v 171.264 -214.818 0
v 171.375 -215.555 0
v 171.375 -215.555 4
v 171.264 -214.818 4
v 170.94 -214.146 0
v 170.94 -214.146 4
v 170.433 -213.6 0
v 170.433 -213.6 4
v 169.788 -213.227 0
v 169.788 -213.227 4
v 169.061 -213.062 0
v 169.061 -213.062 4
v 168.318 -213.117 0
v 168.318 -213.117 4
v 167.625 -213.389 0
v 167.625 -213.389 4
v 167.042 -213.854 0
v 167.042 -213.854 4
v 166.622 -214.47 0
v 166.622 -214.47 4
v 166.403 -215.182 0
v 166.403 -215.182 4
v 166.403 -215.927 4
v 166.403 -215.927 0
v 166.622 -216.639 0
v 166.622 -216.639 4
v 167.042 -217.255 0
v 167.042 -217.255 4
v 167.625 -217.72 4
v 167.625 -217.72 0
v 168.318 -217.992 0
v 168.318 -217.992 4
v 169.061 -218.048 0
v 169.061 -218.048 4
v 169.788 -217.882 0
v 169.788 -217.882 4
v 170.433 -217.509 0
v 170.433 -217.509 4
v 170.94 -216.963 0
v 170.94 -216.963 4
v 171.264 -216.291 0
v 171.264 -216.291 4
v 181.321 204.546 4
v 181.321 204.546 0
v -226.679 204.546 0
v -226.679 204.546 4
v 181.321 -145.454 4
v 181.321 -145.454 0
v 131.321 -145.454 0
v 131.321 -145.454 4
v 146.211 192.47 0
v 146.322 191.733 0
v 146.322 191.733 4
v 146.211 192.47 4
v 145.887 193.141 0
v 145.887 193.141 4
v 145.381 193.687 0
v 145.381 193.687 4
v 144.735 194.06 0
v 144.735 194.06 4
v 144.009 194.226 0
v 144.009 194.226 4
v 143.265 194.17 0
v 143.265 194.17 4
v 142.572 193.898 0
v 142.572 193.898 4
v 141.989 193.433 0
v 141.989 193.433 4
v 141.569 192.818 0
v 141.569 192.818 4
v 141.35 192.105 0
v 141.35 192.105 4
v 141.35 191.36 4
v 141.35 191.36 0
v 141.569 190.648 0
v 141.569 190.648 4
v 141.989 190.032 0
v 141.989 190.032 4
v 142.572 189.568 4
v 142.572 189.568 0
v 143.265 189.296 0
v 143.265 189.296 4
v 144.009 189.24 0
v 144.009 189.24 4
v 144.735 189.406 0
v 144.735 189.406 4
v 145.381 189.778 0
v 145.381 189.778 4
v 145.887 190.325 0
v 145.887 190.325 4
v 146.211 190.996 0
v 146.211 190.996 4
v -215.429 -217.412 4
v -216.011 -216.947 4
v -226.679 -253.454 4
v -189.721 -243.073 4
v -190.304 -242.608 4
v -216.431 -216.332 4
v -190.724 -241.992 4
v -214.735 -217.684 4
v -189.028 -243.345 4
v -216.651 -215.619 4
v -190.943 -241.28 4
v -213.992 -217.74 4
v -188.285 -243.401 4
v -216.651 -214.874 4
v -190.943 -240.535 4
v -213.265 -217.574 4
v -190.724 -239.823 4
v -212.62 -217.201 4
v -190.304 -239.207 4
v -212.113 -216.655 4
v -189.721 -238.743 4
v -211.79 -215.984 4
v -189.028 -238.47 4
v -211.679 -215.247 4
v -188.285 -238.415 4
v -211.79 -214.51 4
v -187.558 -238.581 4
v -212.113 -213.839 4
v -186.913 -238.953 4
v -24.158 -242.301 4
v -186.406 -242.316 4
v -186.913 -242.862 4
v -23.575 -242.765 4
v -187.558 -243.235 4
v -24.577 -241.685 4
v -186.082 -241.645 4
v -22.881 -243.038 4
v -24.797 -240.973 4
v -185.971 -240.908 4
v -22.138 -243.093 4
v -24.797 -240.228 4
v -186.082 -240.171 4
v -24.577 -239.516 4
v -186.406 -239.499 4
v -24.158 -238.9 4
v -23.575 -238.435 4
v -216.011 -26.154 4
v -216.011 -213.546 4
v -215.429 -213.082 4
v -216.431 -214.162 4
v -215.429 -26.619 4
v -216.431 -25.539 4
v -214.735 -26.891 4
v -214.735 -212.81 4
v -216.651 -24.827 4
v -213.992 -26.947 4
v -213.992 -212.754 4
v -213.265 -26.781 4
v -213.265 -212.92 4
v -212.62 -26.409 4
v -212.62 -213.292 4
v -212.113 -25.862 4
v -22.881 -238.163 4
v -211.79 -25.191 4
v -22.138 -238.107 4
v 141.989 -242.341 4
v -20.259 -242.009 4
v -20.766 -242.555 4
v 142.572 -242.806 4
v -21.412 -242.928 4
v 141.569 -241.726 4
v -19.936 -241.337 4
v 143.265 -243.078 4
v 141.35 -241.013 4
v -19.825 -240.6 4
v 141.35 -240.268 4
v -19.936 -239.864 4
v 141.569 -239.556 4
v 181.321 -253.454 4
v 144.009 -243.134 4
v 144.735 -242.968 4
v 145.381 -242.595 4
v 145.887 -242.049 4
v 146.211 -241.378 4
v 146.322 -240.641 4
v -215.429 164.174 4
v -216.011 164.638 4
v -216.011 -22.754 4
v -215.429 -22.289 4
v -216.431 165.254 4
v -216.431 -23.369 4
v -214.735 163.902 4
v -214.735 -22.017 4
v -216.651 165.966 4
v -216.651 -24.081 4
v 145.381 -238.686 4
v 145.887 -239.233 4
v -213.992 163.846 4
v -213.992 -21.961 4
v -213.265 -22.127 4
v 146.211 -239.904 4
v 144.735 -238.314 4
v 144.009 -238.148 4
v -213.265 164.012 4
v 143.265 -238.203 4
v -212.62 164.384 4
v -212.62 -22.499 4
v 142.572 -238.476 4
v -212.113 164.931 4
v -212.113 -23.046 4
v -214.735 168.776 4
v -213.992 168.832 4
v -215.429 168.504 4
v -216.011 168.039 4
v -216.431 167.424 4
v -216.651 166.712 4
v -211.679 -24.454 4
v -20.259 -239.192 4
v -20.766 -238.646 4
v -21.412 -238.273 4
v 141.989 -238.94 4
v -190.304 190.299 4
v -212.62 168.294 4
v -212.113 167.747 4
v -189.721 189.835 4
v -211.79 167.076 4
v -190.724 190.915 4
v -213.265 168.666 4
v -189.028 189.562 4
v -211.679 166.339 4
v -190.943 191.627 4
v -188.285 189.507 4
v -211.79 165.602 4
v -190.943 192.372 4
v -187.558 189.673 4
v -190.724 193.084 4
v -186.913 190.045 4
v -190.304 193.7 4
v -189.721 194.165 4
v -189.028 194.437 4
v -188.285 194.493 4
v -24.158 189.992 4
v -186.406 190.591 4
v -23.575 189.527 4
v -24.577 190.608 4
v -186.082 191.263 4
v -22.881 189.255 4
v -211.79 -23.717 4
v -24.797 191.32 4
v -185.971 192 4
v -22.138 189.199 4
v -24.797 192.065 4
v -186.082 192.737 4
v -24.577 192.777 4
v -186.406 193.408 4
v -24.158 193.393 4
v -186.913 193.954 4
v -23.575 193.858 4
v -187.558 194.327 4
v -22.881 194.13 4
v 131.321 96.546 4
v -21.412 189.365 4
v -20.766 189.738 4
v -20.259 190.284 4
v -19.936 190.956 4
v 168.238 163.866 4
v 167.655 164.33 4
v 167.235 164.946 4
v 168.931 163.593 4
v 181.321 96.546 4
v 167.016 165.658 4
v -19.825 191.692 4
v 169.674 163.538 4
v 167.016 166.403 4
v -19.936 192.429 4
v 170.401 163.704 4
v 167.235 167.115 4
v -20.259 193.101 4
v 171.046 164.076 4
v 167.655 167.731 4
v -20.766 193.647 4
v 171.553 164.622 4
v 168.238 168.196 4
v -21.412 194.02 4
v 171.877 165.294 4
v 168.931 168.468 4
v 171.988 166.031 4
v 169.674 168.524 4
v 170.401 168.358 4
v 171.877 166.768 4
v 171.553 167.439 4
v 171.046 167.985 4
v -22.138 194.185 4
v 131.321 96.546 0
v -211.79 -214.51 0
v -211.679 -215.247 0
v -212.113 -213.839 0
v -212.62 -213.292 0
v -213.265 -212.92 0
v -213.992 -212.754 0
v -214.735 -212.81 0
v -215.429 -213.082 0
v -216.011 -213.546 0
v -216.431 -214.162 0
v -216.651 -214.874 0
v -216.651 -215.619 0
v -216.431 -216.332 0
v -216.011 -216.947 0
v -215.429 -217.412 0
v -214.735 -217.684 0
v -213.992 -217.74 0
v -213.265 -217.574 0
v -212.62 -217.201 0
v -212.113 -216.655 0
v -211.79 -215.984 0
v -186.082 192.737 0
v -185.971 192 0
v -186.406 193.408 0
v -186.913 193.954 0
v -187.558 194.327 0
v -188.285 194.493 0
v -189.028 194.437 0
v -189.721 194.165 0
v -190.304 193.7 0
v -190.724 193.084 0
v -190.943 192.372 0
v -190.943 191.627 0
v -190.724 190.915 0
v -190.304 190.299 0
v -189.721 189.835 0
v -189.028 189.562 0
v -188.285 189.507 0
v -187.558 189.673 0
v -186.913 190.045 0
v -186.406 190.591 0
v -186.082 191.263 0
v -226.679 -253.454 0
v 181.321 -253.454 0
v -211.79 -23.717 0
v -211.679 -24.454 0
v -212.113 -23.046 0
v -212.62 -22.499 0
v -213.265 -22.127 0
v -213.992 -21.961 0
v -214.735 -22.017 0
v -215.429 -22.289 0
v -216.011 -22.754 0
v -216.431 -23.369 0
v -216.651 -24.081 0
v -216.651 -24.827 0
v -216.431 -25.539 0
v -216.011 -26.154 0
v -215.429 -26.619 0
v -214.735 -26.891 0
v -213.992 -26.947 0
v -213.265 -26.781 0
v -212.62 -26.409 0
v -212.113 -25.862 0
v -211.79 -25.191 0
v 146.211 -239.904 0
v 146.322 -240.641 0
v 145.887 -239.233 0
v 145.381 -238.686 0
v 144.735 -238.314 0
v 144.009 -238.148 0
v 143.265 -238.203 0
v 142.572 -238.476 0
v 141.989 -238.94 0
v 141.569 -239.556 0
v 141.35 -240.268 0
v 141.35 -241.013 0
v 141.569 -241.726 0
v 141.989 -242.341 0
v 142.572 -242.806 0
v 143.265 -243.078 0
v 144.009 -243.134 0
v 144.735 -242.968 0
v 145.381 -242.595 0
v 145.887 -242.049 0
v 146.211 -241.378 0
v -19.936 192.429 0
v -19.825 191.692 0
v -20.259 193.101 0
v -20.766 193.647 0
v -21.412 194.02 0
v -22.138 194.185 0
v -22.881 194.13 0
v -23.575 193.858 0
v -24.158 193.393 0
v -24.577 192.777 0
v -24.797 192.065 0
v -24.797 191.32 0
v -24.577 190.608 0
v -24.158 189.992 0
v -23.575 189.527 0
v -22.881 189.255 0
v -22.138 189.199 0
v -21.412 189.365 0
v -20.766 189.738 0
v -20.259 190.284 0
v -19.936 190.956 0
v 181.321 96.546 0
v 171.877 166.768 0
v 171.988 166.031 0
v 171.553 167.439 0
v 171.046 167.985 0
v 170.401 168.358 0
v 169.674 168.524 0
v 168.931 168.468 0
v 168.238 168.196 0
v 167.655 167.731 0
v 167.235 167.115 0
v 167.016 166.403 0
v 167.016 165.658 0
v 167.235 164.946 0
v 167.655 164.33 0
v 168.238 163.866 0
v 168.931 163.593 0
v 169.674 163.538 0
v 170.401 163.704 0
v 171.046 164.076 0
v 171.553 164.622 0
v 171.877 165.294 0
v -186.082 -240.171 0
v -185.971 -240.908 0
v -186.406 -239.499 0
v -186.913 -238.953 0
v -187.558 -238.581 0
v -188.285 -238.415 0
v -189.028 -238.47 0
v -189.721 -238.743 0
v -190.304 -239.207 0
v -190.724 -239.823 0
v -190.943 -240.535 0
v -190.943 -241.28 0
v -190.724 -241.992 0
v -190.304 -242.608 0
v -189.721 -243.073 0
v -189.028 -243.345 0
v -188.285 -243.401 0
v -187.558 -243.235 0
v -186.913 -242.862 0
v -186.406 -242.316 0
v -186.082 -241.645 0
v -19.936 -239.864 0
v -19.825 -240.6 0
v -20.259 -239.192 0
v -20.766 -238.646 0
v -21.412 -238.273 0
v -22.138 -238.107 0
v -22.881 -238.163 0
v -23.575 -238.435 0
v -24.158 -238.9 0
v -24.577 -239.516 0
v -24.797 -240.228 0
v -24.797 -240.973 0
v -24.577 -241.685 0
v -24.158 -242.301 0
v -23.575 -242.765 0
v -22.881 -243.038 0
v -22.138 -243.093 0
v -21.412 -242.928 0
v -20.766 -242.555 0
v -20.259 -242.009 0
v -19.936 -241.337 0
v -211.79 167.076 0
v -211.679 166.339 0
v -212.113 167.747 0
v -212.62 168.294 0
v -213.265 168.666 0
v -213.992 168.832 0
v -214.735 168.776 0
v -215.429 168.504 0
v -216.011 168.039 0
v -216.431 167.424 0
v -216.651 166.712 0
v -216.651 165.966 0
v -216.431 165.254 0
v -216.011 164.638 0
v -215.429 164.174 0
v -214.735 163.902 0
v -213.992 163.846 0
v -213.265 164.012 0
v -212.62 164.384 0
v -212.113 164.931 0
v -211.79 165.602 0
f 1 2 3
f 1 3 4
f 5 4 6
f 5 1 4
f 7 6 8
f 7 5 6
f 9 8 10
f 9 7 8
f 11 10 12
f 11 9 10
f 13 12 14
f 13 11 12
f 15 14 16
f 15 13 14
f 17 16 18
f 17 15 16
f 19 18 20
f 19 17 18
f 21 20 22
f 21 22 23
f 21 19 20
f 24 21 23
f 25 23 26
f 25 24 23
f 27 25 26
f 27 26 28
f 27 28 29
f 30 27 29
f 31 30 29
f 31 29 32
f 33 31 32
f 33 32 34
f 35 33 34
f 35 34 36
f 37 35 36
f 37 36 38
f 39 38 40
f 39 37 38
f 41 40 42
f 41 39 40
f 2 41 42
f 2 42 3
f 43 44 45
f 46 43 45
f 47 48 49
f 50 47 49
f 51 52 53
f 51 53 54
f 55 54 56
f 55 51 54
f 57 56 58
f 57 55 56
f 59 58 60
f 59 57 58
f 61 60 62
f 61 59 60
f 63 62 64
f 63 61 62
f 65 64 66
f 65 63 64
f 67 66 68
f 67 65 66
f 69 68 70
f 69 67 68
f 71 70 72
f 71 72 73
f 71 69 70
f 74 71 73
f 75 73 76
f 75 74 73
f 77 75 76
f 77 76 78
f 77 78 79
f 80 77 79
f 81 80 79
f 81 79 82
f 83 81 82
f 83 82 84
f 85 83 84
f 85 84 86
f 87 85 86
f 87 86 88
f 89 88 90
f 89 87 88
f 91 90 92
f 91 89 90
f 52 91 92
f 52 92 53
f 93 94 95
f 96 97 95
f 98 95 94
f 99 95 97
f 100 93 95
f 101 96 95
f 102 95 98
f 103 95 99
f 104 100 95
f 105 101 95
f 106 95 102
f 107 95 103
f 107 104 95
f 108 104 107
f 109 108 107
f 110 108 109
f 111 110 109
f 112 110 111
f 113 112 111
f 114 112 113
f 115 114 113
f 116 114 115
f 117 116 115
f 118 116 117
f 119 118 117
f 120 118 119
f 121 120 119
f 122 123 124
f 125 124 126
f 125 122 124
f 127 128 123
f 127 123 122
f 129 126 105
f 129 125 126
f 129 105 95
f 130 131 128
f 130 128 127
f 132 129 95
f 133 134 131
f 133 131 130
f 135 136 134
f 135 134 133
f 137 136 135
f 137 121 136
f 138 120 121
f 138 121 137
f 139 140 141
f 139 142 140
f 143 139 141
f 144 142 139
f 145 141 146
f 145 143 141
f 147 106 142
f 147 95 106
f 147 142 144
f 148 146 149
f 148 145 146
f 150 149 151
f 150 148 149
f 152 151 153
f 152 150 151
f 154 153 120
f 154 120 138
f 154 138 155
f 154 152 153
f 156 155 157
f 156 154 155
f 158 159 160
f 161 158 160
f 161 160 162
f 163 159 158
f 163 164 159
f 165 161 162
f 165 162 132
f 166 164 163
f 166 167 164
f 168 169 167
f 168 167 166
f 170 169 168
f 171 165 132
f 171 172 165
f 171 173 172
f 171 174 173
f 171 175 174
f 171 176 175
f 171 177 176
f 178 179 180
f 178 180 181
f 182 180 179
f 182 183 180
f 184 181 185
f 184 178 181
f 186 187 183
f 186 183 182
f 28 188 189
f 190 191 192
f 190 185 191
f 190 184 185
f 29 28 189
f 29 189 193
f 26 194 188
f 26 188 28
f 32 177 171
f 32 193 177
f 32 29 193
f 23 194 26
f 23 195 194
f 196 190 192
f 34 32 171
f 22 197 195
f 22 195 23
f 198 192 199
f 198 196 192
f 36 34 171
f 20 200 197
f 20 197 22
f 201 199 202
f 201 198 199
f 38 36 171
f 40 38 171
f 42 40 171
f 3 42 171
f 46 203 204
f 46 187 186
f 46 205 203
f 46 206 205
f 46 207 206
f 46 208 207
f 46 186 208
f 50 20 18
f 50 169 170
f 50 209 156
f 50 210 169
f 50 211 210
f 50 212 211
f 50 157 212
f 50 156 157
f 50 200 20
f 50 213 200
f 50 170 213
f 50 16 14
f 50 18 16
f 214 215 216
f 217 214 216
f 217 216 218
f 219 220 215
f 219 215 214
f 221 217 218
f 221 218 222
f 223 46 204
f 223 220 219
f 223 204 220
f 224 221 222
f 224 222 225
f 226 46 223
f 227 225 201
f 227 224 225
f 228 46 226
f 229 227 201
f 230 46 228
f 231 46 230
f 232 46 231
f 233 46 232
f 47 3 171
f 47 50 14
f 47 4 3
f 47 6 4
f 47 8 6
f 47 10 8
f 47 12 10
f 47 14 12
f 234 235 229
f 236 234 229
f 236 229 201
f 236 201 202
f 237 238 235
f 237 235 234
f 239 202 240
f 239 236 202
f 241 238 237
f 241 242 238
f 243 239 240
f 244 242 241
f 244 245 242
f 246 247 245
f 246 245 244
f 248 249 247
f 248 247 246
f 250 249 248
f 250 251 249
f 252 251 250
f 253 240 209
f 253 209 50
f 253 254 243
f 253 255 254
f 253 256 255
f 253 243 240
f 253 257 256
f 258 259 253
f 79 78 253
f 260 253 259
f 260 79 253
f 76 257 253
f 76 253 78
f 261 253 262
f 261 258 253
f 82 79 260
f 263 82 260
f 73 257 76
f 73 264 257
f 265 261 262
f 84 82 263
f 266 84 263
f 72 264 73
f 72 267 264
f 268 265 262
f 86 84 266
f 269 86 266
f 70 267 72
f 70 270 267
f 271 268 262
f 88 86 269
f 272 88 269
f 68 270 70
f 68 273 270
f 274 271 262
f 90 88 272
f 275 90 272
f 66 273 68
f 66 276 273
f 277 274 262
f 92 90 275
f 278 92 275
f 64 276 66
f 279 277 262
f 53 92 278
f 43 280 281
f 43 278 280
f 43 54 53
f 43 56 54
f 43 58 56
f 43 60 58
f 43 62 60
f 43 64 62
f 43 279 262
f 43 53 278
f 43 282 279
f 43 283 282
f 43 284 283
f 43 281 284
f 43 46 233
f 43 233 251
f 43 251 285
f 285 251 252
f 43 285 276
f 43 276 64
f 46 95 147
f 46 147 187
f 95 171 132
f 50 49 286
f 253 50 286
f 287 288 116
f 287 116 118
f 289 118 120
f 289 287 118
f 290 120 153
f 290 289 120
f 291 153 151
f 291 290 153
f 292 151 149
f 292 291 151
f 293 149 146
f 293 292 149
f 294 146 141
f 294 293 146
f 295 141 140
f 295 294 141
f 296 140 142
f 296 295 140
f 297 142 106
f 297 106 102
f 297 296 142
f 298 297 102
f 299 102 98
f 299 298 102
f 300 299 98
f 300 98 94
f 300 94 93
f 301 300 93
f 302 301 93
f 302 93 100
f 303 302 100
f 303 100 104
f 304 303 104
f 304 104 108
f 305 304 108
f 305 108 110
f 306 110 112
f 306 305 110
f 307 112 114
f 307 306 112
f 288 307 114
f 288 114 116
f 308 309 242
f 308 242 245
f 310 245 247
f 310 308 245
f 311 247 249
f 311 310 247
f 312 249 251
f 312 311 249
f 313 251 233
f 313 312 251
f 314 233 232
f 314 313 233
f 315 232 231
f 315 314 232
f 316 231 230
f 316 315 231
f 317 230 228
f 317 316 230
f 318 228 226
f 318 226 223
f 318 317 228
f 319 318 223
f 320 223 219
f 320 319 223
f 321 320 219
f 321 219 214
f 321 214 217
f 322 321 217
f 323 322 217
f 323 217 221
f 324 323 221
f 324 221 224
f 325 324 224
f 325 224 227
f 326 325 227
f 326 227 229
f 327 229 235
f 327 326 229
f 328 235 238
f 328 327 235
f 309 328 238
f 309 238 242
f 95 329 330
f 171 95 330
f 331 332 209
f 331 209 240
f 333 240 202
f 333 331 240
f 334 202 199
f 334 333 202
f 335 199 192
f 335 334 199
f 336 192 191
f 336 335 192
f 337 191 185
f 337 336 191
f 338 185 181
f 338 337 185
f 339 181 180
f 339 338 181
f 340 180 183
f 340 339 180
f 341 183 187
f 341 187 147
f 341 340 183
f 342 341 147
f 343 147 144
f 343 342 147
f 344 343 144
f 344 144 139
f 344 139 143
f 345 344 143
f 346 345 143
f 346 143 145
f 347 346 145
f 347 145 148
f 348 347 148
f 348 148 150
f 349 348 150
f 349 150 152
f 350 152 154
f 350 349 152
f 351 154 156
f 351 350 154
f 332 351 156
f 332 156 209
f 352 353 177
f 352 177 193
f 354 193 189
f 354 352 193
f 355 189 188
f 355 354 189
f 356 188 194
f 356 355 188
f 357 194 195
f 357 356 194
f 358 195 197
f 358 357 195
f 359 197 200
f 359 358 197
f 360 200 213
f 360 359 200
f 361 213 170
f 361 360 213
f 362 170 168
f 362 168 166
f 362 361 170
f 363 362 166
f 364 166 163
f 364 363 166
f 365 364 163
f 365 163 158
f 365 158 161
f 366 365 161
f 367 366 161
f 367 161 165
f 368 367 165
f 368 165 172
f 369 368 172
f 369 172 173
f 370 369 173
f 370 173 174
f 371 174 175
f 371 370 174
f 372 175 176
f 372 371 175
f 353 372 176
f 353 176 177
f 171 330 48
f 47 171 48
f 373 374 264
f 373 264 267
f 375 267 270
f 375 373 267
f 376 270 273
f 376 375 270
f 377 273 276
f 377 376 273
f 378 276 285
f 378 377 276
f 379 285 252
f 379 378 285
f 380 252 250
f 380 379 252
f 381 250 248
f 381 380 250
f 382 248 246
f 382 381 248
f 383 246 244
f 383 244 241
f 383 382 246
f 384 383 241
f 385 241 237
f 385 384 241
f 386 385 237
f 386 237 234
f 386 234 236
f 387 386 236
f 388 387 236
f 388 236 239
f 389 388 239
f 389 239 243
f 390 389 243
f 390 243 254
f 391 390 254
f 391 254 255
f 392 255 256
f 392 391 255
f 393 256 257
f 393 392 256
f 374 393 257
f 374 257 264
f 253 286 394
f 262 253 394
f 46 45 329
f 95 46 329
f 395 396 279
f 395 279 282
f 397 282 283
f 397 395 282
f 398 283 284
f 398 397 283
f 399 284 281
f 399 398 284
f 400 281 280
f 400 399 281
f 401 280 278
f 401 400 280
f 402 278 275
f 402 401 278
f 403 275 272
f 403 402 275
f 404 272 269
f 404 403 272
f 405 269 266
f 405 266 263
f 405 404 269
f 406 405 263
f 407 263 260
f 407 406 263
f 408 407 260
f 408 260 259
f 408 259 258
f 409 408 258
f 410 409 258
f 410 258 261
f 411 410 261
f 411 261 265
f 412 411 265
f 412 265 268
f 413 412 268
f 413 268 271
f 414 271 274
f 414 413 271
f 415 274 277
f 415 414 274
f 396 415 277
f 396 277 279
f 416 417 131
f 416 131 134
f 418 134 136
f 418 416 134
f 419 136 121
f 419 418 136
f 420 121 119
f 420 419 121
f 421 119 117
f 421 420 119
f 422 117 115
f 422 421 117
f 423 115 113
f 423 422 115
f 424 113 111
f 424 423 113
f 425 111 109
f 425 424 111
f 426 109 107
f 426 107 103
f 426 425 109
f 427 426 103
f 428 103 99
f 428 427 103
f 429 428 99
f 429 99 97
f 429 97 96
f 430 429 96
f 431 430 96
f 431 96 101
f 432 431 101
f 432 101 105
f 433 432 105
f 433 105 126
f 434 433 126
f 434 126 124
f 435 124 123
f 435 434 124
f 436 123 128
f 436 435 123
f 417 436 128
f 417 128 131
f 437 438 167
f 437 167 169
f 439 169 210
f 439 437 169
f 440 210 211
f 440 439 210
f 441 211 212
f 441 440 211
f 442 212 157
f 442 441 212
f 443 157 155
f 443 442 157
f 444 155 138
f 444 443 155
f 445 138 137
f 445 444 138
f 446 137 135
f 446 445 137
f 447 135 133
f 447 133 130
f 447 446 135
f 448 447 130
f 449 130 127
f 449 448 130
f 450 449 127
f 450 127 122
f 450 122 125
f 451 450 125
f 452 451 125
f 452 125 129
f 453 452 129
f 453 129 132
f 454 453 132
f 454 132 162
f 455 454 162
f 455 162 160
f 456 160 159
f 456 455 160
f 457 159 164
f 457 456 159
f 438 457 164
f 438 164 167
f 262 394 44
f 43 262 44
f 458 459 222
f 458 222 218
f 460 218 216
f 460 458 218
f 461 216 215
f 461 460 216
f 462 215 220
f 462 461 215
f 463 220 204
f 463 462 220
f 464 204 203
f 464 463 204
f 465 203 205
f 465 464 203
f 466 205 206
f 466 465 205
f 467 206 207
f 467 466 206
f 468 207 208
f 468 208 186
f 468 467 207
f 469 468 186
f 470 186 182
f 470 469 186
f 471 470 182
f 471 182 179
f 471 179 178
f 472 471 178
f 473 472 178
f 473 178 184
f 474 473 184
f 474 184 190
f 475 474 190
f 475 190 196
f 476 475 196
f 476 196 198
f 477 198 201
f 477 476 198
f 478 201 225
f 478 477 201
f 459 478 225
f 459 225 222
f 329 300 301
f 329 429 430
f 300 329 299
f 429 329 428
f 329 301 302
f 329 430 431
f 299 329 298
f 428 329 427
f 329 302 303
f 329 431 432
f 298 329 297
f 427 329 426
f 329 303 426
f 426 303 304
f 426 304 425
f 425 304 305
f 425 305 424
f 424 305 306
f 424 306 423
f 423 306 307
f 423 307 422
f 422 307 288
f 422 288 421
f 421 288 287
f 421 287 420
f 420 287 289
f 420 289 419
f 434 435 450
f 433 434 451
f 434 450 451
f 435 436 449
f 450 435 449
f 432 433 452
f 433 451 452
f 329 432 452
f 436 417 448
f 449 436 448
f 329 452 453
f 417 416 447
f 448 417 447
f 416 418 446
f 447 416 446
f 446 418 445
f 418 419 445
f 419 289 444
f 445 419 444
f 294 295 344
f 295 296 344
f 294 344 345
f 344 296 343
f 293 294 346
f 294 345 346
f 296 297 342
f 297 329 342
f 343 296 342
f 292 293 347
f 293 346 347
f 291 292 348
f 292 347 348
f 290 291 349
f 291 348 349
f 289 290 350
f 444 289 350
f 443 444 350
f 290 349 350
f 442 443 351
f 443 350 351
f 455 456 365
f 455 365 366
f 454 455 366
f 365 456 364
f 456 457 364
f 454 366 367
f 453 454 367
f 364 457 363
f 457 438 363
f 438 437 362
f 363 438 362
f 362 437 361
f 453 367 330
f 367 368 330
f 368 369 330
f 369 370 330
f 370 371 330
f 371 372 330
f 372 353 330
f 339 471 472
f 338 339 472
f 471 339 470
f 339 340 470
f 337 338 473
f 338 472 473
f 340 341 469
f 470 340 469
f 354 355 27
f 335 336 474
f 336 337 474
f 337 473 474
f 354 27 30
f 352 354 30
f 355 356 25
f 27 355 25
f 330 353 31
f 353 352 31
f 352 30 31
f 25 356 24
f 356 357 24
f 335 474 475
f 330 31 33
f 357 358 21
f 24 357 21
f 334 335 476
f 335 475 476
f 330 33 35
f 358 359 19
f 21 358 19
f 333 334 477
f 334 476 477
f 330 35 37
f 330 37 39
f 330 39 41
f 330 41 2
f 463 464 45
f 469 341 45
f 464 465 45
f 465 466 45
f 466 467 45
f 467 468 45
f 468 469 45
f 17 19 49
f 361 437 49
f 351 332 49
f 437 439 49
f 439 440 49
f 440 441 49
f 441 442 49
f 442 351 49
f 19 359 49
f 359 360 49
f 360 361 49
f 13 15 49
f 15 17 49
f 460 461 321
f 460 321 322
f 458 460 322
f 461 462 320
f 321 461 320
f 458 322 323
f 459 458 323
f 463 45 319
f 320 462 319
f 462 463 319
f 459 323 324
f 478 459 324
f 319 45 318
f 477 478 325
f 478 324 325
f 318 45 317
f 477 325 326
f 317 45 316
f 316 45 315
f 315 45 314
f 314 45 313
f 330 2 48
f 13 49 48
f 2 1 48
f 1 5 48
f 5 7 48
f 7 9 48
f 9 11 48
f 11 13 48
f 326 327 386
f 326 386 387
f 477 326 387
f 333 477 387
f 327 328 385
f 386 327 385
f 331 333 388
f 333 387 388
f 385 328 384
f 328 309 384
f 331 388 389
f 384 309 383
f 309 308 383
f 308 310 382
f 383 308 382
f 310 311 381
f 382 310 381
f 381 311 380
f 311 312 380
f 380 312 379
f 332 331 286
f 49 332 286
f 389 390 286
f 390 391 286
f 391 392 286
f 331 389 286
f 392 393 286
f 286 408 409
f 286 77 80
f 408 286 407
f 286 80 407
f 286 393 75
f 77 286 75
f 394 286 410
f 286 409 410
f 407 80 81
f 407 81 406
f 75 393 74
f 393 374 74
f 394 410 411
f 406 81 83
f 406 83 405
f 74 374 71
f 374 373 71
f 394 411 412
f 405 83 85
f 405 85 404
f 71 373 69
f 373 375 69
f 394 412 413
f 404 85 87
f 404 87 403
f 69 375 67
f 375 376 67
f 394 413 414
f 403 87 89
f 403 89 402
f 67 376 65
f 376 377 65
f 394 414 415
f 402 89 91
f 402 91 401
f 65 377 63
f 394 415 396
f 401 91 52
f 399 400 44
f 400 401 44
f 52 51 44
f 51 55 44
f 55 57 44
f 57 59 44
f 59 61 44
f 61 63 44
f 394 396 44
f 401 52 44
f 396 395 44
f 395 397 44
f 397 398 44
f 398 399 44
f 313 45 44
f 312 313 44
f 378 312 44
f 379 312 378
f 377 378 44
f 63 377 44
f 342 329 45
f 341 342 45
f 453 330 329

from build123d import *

# Parameters (mm, degrees)
SKETCH1_R           = 2.5
BOSS_EXTRUDE1_DEPTH = 4


with BuildPart() as part:
    # Sketch1 → Boss-Extrude1 (new body)
    with BuildSketch(Plane.XY):
        Polygon((181.321497127, 204.5460303), (-226.678502873, 204.5460303), (-226.678502873, -253.4539697), (181.321497127, -253.4539697), (181.321497127, -145.4539697), (131.321497127, -145.4539697), (131.321497127, 96.5460303), (181.321497127, 96.5460303), align=None)
        with Locations((-214.178502873, -215.246862919)):
            Circle(SKETCH1_R, mode=Mode.SUBTRACT)
        with Locations((-188.471396092, -240.907728533)):
            Circle(SKETCH1_R, mode=Mode.SUBTRACT)
        with Locations((-22.324949482, -240.60041631)):
            Circle(SKETCH1_R, mode=Mode.SUBTRACT)
        with Locations((143.821776426, -240.640809696)):
            Circle(SKETCH1_R, mode=Mode.SUBTRACT)
        with Locations((168.874598055, -215.554555333)):
            Circle(SKETCH1_R, mode=Mode.SUBTRACT)
        with Locations((169.487625208, 166.030738683)):
            Circle(SKETCH1_R, mode=Mode.SUBTRACT)
        with Locations((143.821776426, 191.732870295)):
            Circle(SKETCH1_R, mode=Mode.SUBTRACT)
        with Locations((-22.324949482, 191.692476909)):
            Circle(SKETCH1_R, mode=Mode.SUBTRACT)
        with Locations((-188.471396092, 191.999789133)):
            Circle(SKETCH1_R, mode=Mode.SUBTRACT)
        with Locations((-214.178502873, 166.338923519)):
            Circle(SKETCH1_R, mode=Mode.SUBTRACT)
        with Locations((-214.178502873, -24.4539697)):
            Circle(SKETCH1_R, mode=Mode.SUBTRACT)
    extrude(amount=BOSS_EXTRUDE1_DEPTH)


solid = part.part
